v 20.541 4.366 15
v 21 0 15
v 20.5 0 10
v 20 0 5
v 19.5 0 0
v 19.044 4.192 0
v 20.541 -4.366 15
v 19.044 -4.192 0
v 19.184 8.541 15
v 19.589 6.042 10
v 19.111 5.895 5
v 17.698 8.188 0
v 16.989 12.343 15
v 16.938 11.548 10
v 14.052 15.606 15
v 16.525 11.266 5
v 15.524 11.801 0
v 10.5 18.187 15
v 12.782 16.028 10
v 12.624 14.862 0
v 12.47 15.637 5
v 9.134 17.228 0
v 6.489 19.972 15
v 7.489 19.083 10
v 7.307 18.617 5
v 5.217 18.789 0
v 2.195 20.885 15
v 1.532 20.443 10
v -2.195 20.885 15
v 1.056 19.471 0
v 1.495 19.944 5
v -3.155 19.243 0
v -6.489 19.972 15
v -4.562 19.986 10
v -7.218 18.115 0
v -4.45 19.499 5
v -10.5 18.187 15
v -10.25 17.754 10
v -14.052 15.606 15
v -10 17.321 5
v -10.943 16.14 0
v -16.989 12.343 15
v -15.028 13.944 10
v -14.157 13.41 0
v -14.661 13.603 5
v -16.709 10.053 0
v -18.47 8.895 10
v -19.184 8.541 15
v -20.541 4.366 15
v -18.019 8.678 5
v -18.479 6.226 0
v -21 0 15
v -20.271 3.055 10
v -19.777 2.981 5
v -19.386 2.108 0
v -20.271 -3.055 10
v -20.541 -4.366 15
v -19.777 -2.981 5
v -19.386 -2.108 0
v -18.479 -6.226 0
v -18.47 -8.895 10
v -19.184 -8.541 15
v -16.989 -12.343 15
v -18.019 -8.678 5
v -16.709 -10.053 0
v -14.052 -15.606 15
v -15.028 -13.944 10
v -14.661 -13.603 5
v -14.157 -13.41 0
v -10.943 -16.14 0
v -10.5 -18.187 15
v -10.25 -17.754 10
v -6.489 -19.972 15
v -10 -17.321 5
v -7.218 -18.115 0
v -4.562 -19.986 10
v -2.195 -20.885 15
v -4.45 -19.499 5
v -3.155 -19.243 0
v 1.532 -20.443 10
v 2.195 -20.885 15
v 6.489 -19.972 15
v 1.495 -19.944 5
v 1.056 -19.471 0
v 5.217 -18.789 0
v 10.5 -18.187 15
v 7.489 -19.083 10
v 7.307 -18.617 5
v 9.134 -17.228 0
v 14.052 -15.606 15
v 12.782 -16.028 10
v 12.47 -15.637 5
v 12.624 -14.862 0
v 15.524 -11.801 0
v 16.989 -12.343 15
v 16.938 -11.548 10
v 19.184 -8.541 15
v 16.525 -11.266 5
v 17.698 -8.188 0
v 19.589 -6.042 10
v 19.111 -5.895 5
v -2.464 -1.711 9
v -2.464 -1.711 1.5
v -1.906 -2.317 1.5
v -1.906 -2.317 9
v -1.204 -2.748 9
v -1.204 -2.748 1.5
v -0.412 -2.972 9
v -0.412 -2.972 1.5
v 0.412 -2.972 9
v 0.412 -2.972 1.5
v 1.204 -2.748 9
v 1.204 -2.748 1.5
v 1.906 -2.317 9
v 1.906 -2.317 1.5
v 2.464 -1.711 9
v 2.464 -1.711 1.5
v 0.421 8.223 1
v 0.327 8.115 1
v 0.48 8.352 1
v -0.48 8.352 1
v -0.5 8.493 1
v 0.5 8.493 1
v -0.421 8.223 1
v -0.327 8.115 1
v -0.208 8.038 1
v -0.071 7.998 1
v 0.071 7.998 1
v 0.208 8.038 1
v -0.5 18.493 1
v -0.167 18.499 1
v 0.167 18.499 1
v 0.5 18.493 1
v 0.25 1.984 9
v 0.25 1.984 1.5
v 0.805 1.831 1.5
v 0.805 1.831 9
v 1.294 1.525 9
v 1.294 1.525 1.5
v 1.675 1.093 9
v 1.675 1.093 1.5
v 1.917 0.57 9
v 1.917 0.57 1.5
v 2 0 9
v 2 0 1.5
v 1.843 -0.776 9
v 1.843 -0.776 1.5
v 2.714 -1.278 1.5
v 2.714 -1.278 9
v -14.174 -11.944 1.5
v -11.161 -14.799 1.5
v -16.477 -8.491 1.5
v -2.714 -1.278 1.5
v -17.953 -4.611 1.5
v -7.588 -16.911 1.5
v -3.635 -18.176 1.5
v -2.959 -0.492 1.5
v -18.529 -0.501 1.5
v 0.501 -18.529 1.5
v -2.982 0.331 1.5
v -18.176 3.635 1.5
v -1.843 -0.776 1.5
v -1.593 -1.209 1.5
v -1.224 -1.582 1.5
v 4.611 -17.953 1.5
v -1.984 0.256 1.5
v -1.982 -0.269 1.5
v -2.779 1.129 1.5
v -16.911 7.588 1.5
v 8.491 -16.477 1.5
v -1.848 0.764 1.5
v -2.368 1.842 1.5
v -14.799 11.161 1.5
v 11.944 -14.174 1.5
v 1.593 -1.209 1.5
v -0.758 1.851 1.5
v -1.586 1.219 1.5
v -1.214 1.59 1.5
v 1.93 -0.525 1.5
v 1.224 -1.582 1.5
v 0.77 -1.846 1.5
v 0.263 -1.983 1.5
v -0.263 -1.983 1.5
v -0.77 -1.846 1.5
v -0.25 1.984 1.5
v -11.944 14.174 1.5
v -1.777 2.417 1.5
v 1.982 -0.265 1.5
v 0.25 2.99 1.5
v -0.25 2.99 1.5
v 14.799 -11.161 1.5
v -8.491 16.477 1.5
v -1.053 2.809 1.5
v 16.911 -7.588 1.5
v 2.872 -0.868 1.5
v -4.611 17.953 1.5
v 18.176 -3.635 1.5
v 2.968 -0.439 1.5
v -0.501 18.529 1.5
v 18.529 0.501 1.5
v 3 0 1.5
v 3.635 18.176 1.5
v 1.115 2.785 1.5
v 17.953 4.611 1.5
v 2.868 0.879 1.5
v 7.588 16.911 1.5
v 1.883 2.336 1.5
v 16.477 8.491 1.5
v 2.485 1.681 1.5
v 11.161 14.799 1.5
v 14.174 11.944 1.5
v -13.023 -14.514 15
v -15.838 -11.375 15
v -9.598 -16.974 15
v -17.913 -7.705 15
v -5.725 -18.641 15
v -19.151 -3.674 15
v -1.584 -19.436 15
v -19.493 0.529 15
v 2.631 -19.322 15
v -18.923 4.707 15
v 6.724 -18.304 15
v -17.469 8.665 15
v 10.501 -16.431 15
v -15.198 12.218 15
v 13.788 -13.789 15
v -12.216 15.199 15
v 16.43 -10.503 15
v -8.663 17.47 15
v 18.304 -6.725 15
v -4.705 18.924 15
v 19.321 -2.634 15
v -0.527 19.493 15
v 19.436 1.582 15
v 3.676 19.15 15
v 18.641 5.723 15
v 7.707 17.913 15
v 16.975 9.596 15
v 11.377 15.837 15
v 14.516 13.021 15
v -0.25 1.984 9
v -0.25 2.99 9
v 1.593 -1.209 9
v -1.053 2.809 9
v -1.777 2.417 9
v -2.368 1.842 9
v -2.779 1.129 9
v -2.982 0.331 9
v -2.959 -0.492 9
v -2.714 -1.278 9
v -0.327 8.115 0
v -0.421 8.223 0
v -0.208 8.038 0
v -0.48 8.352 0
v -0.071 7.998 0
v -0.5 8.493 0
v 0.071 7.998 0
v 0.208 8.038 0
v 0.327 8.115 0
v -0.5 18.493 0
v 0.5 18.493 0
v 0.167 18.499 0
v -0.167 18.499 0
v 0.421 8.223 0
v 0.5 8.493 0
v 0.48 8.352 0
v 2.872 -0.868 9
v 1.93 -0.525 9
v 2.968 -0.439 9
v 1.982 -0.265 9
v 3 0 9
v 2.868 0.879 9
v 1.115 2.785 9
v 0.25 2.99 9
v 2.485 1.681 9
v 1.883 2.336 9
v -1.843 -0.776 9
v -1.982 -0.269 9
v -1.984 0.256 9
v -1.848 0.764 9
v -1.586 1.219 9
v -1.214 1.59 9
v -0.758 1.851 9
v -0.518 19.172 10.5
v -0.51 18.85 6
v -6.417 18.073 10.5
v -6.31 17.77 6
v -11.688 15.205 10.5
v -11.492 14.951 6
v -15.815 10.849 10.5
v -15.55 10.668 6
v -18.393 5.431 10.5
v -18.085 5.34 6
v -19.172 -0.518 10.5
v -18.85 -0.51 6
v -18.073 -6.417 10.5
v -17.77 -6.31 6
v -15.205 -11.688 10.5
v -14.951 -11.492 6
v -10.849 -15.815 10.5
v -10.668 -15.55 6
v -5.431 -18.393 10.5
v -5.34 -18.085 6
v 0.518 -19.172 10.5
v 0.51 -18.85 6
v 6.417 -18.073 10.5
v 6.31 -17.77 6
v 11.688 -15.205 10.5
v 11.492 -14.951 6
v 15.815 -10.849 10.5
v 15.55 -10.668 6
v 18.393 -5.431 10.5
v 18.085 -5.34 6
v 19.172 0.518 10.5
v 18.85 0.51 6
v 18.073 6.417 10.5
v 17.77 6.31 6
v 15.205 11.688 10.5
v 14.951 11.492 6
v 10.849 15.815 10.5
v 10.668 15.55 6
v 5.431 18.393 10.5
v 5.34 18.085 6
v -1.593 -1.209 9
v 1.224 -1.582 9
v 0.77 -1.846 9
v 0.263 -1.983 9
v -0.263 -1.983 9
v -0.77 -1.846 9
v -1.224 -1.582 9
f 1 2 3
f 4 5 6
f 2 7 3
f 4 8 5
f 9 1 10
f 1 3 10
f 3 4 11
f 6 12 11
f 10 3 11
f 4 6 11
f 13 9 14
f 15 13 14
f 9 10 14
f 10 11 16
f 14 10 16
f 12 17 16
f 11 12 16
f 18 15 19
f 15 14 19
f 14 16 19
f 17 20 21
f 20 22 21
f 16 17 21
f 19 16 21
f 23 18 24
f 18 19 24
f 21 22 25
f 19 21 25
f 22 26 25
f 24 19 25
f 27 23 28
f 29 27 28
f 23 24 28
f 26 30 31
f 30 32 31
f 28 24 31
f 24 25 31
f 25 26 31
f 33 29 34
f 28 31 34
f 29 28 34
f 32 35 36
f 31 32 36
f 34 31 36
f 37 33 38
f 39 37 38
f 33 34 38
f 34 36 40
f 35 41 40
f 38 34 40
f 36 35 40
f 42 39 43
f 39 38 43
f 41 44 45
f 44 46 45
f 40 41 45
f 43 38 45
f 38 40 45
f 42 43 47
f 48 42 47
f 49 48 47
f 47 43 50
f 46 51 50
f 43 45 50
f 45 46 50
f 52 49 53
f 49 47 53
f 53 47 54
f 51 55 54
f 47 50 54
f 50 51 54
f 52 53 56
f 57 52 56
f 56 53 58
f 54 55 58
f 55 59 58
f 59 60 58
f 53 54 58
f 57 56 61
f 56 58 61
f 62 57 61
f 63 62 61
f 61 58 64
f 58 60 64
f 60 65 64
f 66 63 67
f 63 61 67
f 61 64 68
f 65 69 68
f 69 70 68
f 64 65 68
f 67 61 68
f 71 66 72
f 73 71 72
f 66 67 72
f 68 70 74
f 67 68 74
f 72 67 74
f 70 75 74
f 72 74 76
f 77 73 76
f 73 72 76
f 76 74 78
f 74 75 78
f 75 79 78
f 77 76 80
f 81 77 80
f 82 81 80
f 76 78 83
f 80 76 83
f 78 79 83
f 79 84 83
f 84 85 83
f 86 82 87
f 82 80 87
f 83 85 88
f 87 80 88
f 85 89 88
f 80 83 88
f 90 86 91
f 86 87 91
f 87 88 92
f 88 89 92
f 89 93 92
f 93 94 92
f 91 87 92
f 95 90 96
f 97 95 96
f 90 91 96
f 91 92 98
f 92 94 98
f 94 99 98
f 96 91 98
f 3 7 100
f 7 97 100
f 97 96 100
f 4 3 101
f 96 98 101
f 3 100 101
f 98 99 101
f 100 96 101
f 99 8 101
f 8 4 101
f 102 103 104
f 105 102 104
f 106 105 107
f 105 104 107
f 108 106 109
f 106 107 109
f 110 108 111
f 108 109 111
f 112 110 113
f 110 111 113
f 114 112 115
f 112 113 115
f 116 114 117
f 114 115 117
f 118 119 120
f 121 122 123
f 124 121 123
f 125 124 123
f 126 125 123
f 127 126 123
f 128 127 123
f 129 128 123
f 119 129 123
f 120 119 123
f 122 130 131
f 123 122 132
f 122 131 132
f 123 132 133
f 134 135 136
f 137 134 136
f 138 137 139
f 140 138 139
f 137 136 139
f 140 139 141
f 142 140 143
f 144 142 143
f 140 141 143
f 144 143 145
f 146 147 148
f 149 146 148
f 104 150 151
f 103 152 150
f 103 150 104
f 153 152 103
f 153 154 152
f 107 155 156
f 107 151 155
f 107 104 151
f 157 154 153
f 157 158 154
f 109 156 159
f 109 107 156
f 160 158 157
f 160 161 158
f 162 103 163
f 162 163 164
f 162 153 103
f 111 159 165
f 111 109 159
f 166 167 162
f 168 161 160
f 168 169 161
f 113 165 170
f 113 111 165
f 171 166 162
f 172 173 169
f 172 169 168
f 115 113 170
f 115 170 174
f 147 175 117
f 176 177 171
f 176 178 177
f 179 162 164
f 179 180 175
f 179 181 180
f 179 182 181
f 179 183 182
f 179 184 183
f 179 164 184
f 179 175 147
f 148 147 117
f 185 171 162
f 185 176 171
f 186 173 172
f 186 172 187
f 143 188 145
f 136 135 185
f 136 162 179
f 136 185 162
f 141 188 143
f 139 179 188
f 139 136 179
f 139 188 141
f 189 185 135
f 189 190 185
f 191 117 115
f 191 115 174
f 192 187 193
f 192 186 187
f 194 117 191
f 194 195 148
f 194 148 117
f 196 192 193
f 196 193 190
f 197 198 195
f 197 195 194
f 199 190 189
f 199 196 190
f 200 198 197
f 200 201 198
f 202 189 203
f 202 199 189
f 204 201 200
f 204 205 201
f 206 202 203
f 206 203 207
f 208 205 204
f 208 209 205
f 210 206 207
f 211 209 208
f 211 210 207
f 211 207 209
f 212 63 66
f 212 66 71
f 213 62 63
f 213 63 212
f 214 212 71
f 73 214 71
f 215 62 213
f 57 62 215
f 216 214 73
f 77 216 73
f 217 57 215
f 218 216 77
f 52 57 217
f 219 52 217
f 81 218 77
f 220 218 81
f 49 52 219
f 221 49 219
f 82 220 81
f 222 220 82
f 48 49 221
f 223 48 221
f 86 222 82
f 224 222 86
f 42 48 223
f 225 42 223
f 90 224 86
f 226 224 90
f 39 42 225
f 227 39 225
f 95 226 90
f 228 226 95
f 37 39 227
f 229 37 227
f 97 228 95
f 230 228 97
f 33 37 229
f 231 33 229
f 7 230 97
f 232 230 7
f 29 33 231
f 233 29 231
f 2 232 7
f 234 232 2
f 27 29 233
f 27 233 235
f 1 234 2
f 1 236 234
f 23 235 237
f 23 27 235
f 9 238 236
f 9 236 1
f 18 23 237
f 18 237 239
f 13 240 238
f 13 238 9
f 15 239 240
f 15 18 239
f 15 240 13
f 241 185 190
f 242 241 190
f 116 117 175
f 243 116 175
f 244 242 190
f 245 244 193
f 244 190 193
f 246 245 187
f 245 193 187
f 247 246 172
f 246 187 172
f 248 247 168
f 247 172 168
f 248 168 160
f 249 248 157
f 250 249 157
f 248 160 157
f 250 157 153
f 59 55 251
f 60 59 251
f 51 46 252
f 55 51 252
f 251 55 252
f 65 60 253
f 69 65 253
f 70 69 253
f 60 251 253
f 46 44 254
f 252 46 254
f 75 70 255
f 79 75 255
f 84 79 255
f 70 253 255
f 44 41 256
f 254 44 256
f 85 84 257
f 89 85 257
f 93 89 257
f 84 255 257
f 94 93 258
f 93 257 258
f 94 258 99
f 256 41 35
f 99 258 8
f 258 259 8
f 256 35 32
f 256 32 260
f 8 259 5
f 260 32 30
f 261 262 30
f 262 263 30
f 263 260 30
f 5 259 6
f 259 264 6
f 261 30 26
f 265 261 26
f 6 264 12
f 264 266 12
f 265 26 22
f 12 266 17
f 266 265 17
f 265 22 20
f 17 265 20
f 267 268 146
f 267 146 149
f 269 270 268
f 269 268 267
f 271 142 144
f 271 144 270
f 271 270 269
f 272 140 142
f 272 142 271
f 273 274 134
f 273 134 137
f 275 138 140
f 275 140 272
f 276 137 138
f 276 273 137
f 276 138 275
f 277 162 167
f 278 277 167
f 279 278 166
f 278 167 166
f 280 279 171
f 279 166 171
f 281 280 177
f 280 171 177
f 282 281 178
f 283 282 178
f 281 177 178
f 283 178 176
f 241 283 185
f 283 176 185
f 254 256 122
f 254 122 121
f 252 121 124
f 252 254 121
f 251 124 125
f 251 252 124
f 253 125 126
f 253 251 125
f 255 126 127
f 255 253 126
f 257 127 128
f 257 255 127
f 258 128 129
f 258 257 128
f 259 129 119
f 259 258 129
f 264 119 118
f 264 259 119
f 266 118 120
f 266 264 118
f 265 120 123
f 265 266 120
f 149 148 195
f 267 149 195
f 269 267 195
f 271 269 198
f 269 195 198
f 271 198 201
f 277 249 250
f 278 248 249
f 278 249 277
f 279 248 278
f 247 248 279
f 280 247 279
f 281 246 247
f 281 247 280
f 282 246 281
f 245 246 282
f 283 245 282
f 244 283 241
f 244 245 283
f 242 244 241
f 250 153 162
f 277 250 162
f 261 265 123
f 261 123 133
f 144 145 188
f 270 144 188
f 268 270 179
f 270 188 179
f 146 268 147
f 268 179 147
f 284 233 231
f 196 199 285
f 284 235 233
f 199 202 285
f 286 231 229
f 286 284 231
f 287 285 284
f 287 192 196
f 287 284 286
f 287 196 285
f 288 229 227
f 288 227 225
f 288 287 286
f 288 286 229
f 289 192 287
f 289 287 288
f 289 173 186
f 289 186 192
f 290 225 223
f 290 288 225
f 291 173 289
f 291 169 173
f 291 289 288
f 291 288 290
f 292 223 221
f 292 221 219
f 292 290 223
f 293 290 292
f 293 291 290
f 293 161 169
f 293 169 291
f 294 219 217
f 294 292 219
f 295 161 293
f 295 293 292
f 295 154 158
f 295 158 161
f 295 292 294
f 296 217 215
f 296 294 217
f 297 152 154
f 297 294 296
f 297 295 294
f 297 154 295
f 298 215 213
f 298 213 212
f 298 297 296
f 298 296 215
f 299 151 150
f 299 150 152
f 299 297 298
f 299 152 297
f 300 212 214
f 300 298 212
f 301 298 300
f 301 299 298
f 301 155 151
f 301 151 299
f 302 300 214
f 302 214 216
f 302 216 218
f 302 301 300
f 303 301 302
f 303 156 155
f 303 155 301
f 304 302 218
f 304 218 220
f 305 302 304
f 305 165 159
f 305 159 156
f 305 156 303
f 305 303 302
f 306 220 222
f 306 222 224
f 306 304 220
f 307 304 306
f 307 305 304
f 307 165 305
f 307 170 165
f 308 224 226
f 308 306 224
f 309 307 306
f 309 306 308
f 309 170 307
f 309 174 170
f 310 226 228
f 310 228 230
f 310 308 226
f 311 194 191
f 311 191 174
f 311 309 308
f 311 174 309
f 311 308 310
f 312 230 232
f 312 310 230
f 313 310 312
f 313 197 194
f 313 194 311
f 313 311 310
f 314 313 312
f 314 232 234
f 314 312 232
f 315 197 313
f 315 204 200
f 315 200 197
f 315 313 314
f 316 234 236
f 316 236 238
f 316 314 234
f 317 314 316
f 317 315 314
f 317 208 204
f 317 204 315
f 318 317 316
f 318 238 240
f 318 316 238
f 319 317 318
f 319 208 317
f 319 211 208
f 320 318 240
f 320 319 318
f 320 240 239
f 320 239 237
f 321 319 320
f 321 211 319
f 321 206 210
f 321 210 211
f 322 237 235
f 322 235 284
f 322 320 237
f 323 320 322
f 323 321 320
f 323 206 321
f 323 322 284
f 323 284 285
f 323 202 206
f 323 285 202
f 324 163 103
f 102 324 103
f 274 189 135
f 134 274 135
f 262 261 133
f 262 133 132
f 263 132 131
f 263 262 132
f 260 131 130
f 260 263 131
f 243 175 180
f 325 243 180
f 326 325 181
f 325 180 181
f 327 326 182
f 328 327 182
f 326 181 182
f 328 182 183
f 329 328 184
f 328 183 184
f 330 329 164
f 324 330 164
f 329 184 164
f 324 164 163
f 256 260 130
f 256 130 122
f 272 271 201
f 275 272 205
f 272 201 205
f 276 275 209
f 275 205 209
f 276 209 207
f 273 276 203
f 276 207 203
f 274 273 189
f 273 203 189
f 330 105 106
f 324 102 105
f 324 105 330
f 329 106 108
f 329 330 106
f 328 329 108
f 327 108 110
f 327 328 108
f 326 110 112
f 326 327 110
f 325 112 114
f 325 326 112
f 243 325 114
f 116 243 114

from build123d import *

# Parameters (mm, degrees)
F0_R     = 21
F1_DEPTH = 15
F2_DEPTH = 1.5
F3_DEPTH = 1
F4_DEPTH = 9
F5_SIZE2 = 1.49999
F5_SIZE  = 14.99999


# Not quite as in the source:
# - a fillet or chamfer that OpenCascade refuses, or shapes differently, is made with other operations: its cross-section is extruded or revolved along the edge and cut away or added
# - a fillet or chamfer is up to 0.001 mm smaller than in the source, because OpenCascade refuses the exact size


with BuildPart() as f1:
    # F0 (on Top) → F1 (new body)
    with BuildSketch(Plane.XY):
        Circle(F0_R)
        with BuildLine():
            ThreePointArc((0.5, 18.4932420089), (13.2570735836, 12.9034879006), (18.5, 0))
            ThreePointArc((18.5, 0), (-12.9034879006, -13.2570735836), (-0.5, 18.4932420089))
            ThreePointArc((-0.5, 18.4932420089), (0, 18.5), (0.5, 18.4932420089))
        make_face(mode=Mode.SUBTRACT)
    extrude(amount=F1_DEPTH)

    # F0 (on Top) → F2 (join)
    with BuildSketch(Plane.XY):
        with BuildLine():
            ThreePointArc((-0.5, 18.4932420089), (-12.9034879006, -13.2570735836), (18.5, 0))
            ThreePointArc((18.5, 0), (13.2570735836, 12.9034879006), (0.5, 18.4932420089))
            Line((0.5, 18.4932420089), (0.5, 8.4932420089))
            ThreePointArc((0.5, 8.4932420089), (0, 7.9932420089), (-0.5, 8.4932420089))
            Line((-0.5, 8.4932420089), (-0.5, 18.4932420089))
        make_face()
        with BuildLine():
            ThreePointArc((0.25, 2.9895651858), (2.2079402166, 2.0310096012), (3, 0))
            ThreePointArc((3, 0), (2.9276371182, -0.6549358016), (2.7140393972, -1.2782762419))
            ThreePointArc((2.7140393972, -1.2782762419), (2.5980762114, -1.5), (2.4640393972, -1.7112889438))
            ThreePointArc((2.4640393972, -1.7112889438), (0, -3), (-2.4640393972, -1.7112889438))
            ThreePointArc((-2.4640393972, -1.7112889438), (-2.5980762114, -1.5), (-2.7140393972, -1.2782762419))
            ThreePointArc((-2.7140393972, -1.2782762419), (-2.5980762114, 1.5), (-0.25, 2.9895651858))
            ThreePointArc((-0.25, 2.9895651858), (0, 3), (0.25, 2.9895651858))
        make_face(mode=Mode.SUBTRACT)
        with BuildLine():
            ThreePointArc((2, 0), (1.5, 1.3228756555), (0.25, 1.9843134833))
            ThreePointArc((0.25, 1.9843134833), (0, 2), (-0.25, 1.9843134833))
            ThreePointArc((-0.25, 1.9843134833), (-1.7320508076, 1), (-1.8434658856, -0.7756503907))
            ThreePointArc((-1.8434658856, -0.7756503907), (-1.7320508076, -1), (-1.5934658856, -1.2086630926))
            ThreePointArc((-1.5934658856, -1.2086630926), (0, -2), (1.5934658856, -1.2086630926))
            ThreePointArc((1.5934658856, -1.2086630926), (1.7320508076, -1), (1.8434658856, -0.7756503907))
            ThreePointArc((1.8434658856, -0.7756503907), (1.9604759334, -0.3956439237), (2, 0))
        make_face()
        with BuildLine():
            Line((0.5, 8.4932420089), (0.5, 18.4932420089))
            Line((0.5, 18.4932420089), (-0.5, 18.4932420089))
            Line((-0.5, 18.4932420089), (-0.5, 8.4932420089))
            ThreePointArc((-0.5, 8.4932420089), (0, 8.9932420089), (0.5, 8.4932420089))
        make_face()
        with BuildLine():
            Line((-0.25, 1.9843134833), (-0.25, 2.9895651858))
            ThreePointArc((-0.25, 2.9895651858), (-2.5980762114, 1.5), (-2.7140393972, -1.2782762419))
            Line((-2.7140393972, -1.2782762419), (-1.8434658856, -0.7756503907))
            ThreePointArc((-1.8434658856, -0.7756503907), (-1.7320508076, 1), (-0.25, 1.9843134833))
        make_face()
        with BuildLine():
            ThreePointArc((-2.4640393972, -1.7112889438), (0, -3), (2.4640393972, -1.7112889438))
            Line((2.4640393972, -1.7112889438), (1.5934658856, -1.2086630926))
            ThreePointArc((1.5934658856, -1.2086630926), (0, -2), (-1.5934658856, -1.2086630926))
            Line((-1.5934658856, -1.2086630926), (-2.4640393972, -1.7112889438))
        make_face()
        with BuildLine():
            ThreePointArc((2.7140393972, -1.2782762419), (2.9276371182, -0.6549358016), (3, 0))
            ThreePointArc((3, 0), (2.2079402166, 2.0310096012), (0.25, 2.9895651858))
            Line((0.25, 2.9895651858), (0.25, 1.9843134833))
            ThreePointArc((0.25, 1.9843134833), (1.5, 1.3228756555), (2, 0))
            ThreePointArc((2, 0), (1.9604759334, -0.3956439237), (1.8434658856, -0.7756503907))
            Line((1.8434658856, -0.7756503907), (2.7140393972, -1.2782762419))
        make_face()
        with BuildLine():
            Line((0.25, 1.9843134833), (0.25, 2.9895651858))
            ThreePointArc((0.25, 2.9895651858), (0, 3), (-0.25, 2.9895651858))
            Line((-0.25, 2.9895651858), (-0.25, 1.9843134833))
            ThreePointArc((-0.25, 1.9843134833), (0, 2), (0.25, 1.9843134833))
        make_face()
        with BuildLine():
            ThreePointArc((2.4640393972, -1.7112889438), (2.5980762114, -1.5), (2.7140393972, -1.2782762419))
            Line((2.7140393972, -1.2782762419), (1.8434658856, -0.7756503907))
            ThreePointArc((1.8434658856, -0.7756503907), (1.7320508076, -1), (1.5934658856, -1.2086630926))
            Line((1.5934658856, -1.2086630926), (2.4640393972, -1.7112889438))
        make_face()
        with BuildLine():
            Line((-1.8434658856, -0.7756503907), (-2.7140393972, -1.2782762419))
            ThreePointArc((-2.7140393972, -1.2782762419), (-2.5980762114, -1.5), (-2.4640393972, -1.7112889438))
            Line((-2.4640393972, -1.7112889438), (-1.5934658856, -1.2086630926))
            ThreePointArc((-1.5934658856, -1.2086630926), (-1.7320508076, -1), (-1.8434658856, -0.7756503907))
        make_face()
        with BuildLine():
            ThreePointArc((-0.5, 8.4932420089), (0, 7.9932420089), (0.5, 8.4932420089))
            Line((0.5, 8.4932420089), (-0.5, 8.4932420089))
        make_face()
        with BuildLine():
            Line((-0.5, 8.4932420089), (0.5, 8.4932420089))
            ThreePointArc((0.5, 8.4932420089), (0, 8.9932420089), (-0.5, 8.4932420089))
        make_face()
        with BuildLine():
            Line((-0.5, 18.4932420089), (0.5, 18.4932420089))
            ThreePointArc((0.5, 18.4932420089), (0, 18.5), (-0.5, 18.4932420089))
        make_face()
    extrude(amount=F2_DEPTH)

    # F0 (on Top) → F3 (cut)
    with BuildSketch(Plane.XY):
        with BuildLine():
            ThreePointArc((-0.5, 8.4932420089), (0, 7.9932420089), (0.5, 8.4932420089))
            Line((0.5, 8.4932420089), (-0.5, 8.4932420089))
        make_face()
        with BuildLine():
            Line((-0.5, 8.4932420089), (0.5, 8.4932420089))
            ThreePointArc((0.5, 8.4932420089), (0, 8.9932420089), (-0.5, 8.4932420089))
        make_face()
        with BuildLine():
            Line((-0.5, 18.4932420089), (0.5, 18.4932420089))
            ThreePointArc((0.5, 18.4932420089), (0, 18.5), (-0.5, 18.4932420089))
        make_face()
        with BuildLine():
            Line((0.5, 8.4932420089), (0.5, 18.4932420089))
            Line((0.5, 18.4932420089), (-0.5, 18.4932420089))
            Line((-0.5, 18.4932420089), (-0.5, 8.4932420089))
            ThreePointArc((-0.5, 8.4932420089), (0, 8.9932420089), (0.5, 8.4932420089))
        make_face()
    extrude(amount=F3_DEPTH, mode=Mode.SUBTRACT)

    # F0 (on Top) → F4 (join)
    with BuildSketch(Plane.XY):
        with BuildLine():
            Line((-0.25, 1.9843134833), (-0.25, 2.9895651858))
            ThreePointArc((-0.25, 2.9895651858), (-2.5980762114, 1.5), (-2.7140393972, -1.2782762419))
            Line((-2.7140393972, -1.2782762419), (-1.8434658856, -0.7756503907))
            ThreePointArc((-1.8434658856, -0.7756503907), (-1.7320508076, 1), (-0.25, 1.9843134833))
        make_face()
        with BuildLine():
            ThreePointArc((2.7140393972, -1.2782762419), (2.9276371182, -0.6549358016), (3, 0))
            ThreePointArc((3, 0), (2.2079402166, 2.0310096012), (0.25, 2.9895651858))
            Line((0.25, 2.9895651858), (0.25, 1.9843134833))
            ThreePointArc((0.25, 1.9843134833), (1.5, 1.3228756555), (2, 0))
            ThreePointArc((2, 0), (1.9604759334, -0.3956439237), (1.8434658856, -0.7756503907))
            Line((1.8434658856, -0.7756503907), (2.7140393972, -1.2782762419))
        make_face()
        with BuildLine():
            ThreePointArc((-2.4640393972, -1.7112889438), (0, -3), (2.4640393972, -1.7112889438))
            Line((2.4640393972, -1.7112889438), (1.5934658856, -1.2086630926))
            ThreePointArc((1.5934658856, -1.2086630926), (0, -2), (-1.5934658856, -1.2086630926))
            Line((-1.5934658856, -1.2086630926), (-2.4640393972, -1.7112889438))
        make_face()
    extrude(amount=F4_DEPTH)

    # F5 (size 15 and 1.5 in the source; OpenCascade refuses exactly that, so slightly less here)
    f5_edges = [f1.edges().sort_by_distance(p)[0] for p in [
        (-21, 0, 0),
    ]]
    f5_side = f1.faces().sort_by_distance((-21, 0, 7.5))[0]
    chamfer(f5_edges, length=F5_SIZE, length2=F5_SIZE2, reference=f5_side)

    # F6: chamfer of 14 x 1 on 1 edges, made by hand


with BuildPart() as f6_tool2:
    # F6_s3 → F6_t4 (revolve)
    with BuildSketch(Plane(origin=(0, 0, 0), x_dir=(0, 0, 1), z_dir=(0.9996347032, 0.027027027, 0))):
        Polygon((15, -19.5), (1, -18.5), (15, -18.5), align=None)
    revolve(axis=Axis((0, 0, 15), (0, 0, 1)))

    split(bisect_by=Plane.XY.offset(1.5), keep=Keep.TOP)


with BuildPart() as f1_1:
    add(f1.part)

    # F6_t1: cut F6_tool2
    add(f6_tool2.part, mode=Mode.SUBTRACT)


solid = f1_1.part
